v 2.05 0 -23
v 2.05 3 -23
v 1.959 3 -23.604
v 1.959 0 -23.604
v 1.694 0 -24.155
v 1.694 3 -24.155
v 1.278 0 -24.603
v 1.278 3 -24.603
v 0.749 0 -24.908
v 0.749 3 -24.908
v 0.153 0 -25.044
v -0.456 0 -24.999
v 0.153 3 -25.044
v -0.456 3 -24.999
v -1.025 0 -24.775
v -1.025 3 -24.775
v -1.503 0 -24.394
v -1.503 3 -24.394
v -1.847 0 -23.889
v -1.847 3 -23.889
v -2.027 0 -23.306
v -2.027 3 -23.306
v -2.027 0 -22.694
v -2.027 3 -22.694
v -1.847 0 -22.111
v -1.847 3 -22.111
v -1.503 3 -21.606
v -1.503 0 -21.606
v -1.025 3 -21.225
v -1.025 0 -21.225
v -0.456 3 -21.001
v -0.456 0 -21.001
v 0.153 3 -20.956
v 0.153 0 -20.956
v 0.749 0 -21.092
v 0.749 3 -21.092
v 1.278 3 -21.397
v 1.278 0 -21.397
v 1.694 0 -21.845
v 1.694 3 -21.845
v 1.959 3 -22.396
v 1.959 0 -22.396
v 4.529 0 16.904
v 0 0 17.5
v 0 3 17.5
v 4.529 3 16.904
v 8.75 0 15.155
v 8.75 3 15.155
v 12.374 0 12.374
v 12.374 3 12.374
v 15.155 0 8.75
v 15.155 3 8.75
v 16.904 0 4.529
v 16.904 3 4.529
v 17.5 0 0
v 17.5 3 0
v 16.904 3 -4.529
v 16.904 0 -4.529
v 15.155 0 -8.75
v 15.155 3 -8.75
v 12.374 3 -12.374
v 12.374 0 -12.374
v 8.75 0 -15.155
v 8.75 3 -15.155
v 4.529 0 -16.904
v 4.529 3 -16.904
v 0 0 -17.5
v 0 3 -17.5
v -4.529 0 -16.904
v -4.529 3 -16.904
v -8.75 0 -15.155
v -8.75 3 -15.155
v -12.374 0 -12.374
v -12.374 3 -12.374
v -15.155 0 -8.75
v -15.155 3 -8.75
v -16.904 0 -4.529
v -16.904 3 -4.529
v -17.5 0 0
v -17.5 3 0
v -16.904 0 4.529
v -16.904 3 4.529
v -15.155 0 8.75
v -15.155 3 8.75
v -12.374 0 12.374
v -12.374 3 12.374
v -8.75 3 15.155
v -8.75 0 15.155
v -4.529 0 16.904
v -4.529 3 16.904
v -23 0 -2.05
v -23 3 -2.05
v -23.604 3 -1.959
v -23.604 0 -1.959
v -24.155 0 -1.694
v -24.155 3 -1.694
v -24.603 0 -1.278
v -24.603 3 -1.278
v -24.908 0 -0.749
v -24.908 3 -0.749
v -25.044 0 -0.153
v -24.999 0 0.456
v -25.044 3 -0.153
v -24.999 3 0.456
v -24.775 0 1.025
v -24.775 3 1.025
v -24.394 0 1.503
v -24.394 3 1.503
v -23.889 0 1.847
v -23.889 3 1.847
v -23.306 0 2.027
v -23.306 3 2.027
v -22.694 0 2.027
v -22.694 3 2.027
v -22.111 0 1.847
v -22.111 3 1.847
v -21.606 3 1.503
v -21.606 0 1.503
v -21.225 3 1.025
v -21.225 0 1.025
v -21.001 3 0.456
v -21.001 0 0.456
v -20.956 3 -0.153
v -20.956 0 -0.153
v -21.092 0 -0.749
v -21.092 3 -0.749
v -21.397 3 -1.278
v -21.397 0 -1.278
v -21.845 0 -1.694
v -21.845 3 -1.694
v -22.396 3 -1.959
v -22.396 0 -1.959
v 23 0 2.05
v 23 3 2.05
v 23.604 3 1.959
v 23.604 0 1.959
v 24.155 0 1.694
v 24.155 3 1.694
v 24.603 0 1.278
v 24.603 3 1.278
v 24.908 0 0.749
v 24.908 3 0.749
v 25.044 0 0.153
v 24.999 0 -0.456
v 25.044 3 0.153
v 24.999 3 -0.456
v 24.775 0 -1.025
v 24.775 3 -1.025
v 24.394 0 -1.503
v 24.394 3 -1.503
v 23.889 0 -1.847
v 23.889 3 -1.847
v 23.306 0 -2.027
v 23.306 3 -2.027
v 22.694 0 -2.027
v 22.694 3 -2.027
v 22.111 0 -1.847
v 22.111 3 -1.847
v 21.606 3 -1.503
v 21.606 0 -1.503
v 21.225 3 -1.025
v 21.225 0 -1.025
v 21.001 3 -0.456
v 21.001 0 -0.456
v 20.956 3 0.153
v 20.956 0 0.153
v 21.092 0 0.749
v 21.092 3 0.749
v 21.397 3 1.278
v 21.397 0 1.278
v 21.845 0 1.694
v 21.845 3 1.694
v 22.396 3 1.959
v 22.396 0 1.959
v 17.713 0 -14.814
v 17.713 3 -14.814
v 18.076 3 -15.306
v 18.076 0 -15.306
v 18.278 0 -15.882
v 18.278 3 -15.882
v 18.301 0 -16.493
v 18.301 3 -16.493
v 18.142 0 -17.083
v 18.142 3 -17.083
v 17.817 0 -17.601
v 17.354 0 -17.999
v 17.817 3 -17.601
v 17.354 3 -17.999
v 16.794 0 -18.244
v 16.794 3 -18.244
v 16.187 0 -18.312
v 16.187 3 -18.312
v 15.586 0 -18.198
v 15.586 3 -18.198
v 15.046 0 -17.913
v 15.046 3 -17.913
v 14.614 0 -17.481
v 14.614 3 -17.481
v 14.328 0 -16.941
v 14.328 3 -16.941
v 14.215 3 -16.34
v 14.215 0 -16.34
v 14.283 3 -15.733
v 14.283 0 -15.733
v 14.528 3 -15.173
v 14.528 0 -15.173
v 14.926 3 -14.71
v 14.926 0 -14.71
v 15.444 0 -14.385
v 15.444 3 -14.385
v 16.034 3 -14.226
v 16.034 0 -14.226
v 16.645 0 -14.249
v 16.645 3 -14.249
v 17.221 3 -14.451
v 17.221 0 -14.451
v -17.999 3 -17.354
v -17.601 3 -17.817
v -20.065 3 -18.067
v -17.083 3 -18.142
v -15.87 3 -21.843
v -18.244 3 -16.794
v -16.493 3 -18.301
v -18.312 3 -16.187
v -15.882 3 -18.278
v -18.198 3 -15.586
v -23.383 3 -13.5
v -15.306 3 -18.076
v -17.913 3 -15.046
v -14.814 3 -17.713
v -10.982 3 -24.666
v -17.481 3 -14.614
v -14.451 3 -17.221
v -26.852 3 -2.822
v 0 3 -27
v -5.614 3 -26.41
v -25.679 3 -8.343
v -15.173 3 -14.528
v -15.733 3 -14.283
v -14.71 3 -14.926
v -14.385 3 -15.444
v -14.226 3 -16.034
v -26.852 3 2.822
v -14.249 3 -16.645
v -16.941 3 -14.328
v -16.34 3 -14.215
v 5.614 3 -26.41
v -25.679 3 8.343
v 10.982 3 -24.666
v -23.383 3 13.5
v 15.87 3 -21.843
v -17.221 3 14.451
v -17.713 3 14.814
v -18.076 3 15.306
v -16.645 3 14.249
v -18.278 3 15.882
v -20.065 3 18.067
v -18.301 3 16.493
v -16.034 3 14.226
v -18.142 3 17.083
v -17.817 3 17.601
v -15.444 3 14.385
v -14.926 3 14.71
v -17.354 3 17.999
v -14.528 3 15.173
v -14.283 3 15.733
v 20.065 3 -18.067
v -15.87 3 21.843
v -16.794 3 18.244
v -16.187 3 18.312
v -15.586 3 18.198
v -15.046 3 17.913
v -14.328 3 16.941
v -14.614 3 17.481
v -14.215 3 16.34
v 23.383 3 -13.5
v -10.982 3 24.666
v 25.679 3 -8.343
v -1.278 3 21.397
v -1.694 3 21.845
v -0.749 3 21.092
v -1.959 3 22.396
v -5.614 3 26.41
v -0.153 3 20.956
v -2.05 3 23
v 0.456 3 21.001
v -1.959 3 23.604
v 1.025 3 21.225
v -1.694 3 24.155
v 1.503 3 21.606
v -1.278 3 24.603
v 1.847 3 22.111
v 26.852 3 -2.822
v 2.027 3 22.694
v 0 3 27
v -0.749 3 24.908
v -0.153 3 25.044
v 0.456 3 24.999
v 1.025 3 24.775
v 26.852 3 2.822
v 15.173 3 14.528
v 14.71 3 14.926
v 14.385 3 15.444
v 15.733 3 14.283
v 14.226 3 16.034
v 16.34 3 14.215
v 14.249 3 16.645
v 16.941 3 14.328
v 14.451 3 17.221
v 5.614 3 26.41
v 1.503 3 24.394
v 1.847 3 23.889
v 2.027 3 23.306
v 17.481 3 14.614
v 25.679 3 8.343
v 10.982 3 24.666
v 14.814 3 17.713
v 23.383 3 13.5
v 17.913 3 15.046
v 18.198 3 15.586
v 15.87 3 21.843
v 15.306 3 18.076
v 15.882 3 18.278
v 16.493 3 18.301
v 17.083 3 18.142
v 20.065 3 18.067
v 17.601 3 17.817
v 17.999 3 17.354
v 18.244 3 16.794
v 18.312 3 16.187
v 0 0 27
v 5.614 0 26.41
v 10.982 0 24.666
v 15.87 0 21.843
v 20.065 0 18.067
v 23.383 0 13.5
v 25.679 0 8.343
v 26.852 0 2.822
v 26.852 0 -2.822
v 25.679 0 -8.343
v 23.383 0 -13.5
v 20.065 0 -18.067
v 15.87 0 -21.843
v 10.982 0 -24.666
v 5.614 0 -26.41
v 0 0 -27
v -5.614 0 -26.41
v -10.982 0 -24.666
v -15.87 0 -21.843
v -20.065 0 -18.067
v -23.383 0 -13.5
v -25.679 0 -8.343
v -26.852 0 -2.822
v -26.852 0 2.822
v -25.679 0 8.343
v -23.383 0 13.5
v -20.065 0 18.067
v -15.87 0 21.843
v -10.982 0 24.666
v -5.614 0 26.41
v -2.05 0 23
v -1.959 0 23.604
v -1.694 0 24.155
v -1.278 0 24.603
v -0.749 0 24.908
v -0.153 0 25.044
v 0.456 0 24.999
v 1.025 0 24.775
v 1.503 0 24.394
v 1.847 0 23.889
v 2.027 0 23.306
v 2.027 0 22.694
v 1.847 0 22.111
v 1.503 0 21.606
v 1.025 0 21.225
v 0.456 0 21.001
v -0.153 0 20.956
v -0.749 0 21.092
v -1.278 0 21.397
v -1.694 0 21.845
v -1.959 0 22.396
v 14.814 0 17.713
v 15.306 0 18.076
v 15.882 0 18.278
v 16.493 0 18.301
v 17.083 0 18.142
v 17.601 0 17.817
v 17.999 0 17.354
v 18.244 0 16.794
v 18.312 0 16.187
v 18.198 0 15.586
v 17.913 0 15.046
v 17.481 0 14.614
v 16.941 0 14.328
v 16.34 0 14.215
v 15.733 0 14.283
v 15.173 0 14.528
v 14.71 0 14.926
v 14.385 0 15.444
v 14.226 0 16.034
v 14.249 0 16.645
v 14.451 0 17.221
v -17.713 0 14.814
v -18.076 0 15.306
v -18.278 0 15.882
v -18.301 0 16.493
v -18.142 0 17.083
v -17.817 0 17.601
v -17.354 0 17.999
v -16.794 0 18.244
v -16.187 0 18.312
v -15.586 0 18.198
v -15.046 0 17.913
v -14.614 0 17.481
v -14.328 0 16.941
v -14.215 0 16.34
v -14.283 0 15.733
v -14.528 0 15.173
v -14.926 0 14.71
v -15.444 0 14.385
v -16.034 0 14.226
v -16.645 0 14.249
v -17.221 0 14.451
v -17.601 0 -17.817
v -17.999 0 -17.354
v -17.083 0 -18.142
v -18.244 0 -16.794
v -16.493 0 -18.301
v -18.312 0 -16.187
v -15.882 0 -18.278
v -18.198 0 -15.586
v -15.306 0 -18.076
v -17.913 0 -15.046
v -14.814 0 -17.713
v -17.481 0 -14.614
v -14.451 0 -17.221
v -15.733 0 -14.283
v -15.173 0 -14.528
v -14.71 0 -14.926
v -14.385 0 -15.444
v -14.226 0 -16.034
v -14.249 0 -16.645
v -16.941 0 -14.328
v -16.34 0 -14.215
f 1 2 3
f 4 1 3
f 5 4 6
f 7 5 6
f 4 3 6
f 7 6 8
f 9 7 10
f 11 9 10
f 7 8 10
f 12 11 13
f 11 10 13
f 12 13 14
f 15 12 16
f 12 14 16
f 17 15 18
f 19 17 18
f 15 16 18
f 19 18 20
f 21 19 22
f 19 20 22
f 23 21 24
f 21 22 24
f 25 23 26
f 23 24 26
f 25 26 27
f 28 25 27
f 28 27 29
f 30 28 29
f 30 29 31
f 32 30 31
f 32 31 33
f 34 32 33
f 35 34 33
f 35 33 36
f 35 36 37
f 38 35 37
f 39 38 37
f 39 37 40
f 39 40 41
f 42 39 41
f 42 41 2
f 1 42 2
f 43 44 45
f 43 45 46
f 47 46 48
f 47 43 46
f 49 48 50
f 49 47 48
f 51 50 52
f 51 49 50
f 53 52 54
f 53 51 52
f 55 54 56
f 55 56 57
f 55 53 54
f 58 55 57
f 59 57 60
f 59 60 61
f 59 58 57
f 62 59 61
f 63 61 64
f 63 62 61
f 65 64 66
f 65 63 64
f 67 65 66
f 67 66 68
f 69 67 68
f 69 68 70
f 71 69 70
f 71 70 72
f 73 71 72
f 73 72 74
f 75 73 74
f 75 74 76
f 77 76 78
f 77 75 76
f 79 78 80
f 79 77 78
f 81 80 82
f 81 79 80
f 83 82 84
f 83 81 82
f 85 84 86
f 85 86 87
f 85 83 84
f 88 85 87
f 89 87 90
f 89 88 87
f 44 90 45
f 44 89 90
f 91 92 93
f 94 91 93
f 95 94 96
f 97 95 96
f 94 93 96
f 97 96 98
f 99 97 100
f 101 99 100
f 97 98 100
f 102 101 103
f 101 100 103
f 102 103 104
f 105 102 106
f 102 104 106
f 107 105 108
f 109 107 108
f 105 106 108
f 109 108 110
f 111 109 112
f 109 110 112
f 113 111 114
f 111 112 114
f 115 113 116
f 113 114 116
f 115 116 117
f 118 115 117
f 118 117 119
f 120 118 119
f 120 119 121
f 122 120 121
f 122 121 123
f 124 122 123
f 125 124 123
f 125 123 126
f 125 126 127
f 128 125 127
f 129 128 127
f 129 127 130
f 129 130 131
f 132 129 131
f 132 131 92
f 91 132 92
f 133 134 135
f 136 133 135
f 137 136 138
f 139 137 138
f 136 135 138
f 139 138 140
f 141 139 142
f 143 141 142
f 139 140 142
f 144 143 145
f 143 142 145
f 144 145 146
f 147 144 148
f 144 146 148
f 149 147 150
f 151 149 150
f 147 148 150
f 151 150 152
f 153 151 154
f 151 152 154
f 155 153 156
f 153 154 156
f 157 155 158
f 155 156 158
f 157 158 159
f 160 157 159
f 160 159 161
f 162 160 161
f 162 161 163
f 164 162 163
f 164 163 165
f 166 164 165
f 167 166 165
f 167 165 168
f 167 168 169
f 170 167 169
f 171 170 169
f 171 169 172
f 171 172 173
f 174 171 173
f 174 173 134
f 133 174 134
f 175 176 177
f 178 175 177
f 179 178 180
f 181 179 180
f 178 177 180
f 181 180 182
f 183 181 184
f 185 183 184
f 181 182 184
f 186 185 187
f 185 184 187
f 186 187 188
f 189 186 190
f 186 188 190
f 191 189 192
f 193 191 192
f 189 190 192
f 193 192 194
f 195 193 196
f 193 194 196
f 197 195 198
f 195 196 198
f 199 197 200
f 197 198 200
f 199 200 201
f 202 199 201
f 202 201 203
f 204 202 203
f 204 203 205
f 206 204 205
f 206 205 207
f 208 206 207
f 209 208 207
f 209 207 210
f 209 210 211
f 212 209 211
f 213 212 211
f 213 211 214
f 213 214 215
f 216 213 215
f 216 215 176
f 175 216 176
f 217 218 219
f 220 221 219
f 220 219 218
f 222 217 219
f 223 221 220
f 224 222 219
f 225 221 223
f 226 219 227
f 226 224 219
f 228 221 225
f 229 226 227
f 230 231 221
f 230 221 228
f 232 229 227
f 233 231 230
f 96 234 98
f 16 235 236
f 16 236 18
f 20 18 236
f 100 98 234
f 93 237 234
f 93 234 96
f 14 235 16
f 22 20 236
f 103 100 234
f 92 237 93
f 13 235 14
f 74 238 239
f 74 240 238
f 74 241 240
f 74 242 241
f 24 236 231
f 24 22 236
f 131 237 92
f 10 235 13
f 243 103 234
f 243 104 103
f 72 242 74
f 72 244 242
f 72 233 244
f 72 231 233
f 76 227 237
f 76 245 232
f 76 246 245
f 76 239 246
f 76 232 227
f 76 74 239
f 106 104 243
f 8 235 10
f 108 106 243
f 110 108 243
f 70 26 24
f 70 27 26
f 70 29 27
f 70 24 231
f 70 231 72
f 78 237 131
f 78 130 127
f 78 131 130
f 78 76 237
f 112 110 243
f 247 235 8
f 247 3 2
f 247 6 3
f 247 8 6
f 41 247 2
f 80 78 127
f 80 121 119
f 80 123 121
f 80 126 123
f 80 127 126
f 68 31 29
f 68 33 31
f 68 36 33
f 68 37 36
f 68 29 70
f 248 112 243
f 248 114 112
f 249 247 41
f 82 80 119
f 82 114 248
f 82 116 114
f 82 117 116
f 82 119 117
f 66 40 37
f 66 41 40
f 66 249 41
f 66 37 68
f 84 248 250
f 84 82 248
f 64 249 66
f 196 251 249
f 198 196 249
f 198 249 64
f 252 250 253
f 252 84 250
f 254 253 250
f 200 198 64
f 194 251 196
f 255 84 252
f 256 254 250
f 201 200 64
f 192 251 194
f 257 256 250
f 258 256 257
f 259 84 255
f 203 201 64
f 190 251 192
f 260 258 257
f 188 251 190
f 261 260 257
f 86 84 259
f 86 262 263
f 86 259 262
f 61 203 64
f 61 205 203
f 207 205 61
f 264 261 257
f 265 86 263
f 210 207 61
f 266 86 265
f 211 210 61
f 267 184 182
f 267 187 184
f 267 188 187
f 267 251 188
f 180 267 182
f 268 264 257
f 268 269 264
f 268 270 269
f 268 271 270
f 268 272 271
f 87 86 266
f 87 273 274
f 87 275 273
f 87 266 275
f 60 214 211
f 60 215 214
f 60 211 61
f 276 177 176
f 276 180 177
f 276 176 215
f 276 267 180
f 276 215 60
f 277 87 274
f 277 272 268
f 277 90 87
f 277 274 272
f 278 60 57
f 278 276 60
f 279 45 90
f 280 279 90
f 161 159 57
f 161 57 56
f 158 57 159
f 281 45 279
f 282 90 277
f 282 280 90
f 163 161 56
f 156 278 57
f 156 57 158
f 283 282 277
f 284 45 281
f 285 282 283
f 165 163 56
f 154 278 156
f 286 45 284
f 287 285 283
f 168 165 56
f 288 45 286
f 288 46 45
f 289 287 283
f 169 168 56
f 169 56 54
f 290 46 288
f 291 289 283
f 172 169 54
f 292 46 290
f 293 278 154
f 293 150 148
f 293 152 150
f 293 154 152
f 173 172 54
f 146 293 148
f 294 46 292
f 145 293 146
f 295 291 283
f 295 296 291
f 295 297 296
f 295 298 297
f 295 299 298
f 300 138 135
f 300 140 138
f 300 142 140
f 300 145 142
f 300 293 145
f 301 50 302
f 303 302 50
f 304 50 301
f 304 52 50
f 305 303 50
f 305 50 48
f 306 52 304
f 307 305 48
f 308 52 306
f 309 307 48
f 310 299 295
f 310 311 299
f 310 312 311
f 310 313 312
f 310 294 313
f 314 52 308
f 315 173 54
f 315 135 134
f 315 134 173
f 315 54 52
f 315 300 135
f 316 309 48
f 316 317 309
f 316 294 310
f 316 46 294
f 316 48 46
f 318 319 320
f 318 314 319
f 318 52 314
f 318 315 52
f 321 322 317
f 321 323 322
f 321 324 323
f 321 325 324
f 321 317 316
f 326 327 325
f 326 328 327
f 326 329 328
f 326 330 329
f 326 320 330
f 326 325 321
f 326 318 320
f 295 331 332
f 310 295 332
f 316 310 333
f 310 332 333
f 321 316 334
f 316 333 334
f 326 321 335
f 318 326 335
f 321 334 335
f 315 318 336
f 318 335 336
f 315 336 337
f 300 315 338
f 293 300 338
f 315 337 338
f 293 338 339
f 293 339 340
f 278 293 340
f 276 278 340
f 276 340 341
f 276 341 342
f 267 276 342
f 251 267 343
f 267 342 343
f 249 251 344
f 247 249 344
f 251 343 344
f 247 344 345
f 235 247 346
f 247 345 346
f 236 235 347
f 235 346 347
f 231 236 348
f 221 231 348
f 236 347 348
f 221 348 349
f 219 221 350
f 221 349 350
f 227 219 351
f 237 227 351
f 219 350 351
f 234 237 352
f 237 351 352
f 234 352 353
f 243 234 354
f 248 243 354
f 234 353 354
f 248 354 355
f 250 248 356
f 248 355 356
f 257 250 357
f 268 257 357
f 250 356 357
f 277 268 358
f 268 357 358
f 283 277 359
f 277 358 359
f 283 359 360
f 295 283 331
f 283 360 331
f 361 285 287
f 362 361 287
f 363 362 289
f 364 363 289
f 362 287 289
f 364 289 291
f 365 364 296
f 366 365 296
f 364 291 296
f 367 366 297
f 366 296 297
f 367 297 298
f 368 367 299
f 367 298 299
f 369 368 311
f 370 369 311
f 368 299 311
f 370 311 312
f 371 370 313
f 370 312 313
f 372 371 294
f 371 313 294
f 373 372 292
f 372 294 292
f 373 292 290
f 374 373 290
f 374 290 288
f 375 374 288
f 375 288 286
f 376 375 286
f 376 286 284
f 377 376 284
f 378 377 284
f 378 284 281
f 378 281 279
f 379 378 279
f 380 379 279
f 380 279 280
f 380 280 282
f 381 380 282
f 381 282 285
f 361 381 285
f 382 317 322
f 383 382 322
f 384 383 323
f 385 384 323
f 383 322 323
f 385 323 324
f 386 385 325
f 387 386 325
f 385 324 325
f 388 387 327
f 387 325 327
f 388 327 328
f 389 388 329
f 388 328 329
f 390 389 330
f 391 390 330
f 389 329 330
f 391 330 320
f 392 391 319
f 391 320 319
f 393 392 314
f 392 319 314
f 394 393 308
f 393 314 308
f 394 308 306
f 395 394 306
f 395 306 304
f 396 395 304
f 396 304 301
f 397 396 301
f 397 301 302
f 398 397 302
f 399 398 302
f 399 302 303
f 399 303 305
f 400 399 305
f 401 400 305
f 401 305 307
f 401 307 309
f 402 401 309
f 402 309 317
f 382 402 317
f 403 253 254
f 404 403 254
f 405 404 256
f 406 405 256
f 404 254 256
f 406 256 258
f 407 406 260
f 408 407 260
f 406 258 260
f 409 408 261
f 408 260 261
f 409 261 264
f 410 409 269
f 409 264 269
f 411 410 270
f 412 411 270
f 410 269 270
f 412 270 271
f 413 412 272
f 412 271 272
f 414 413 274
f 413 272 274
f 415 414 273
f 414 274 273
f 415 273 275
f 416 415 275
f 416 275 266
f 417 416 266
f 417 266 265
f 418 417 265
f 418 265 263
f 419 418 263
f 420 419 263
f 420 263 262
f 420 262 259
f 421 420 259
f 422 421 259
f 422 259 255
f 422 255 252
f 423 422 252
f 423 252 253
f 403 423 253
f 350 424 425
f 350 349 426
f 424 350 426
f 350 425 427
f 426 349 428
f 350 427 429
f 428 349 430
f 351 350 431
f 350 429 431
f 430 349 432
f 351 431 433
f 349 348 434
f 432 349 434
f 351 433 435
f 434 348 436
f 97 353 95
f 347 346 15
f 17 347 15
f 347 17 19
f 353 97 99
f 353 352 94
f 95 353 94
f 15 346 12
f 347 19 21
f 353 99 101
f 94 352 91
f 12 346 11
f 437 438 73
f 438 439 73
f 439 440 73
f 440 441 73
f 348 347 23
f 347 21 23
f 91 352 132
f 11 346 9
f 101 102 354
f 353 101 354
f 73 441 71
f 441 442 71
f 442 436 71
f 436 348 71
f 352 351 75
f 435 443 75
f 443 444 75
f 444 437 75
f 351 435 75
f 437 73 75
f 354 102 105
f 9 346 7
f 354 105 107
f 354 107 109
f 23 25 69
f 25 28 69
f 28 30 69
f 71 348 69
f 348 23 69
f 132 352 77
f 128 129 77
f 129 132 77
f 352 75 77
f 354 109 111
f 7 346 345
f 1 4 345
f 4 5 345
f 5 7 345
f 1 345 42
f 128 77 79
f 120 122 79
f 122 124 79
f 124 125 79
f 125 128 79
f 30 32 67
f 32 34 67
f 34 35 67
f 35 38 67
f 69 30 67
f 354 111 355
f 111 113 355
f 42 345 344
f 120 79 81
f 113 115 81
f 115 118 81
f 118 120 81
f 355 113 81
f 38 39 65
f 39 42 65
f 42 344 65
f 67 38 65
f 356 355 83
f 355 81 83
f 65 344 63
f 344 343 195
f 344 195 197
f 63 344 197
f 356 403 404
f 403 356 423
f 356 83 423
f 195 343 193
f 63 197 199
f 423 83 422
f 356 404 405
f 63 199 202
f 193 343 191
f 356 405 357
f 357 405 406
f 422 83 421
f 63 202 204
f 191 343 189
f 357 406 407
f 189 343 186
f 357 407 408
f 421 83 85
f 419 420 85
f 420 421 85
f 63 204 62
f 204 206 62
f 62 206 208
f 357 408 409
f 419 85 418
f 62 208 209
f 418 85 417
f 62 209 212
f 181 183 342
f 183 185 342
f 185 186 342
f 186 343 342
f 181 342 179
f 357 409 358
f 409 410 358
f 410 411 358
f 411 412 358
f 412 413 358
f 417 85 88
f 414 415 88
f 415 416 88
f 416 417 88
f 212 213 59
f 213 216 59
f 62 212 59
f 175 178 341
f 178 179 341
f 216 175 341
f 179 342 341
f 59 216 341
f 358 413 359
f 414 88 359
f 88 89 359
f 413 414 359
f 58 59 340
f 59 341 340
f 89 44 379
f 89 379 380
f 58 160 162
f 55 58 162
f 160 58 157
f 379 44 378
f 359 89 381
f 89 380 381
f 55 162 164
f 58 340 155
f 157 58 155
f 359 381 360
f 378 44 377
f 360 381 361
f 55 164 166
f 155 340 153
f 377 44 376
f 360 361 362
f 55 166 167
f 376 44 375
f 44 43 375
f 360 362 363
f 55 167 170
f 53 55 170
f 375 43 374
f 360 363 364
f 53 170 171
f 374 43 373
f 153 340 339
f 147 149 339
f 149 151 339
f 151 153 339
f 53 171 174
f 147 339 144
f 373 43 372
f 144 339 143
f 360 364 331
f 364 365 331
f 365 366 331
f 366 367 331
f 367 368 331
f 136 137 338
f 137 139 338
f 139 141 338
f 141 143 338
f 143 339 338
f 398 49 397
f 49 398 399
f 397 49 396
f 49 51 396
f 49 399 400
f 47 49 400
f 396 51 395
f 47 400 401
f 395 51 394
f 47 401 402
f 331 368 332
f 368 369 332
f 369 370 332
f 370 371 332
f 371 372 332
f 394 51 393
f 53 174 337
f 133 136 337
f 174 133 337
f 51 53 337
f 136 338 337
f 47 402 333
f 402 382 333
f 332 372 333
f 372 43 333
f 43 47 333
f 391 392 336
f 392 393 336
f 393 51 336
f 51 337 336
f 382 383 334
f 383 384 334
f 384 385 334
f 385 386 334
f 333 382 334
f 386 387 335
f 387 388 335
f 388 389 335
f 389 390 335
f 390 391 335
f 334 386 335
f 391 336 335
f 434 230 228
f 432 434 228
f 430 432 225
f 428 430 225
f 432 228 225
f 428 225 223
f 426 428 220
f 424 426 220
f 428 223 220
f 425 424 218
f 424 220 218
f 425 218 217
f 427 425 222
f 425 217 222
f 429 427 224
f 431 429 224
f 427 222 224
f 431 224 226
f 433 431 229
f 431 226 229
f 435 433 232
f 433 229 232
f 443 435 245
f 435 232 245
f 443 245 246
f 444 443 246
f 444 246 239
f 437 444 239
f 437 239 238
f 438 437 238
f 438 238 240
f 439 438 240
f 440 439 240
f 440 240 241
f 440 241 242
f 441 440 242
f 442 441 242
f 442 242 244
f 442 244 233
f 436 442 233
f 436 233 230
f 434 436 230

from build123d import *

# Parameters (mm, degrees)
SKETCH1_R           = 27
SKETCH1_R_2         = 17.5
BOSS_EXTRUDE1_DEPTH = 3
SKETCH2_R           = 2.05
CUT_EXTRUDE1_DEPTH  = 39.301436004
CIRPATTERN1_COUNT   = 8


with BuildPart() as part:
    # Sketch1 → Boss-Extrude1 (new body)
    with BuildSketch(Plane(origin=(0, 0, 0), x_dir=(1, 0, 0), z_dir=(0, 1, 0))):
        with Locations(Location((0, 0, 0), (0, 0, 270))):
            Circle(SKETCH1_R)
        with Locations(Location((0, 0, 0), (0, 0, 270))):
            Circle(SKETCH1_R_2, mode=Mode.SUBTRACT)
    extrude(amount=BOSS_EXTRUDE1_DEPTH)

    # Sketch2 → Cut-Extrude1 (cut, through all)
    with BuildSketch(Plane(origin=(0, 3, 0), x_dir=(1, 0, 0), z_dir=(0, 1, 0))):
        with Locations(Location((23, 0, 0), (0, 0, 270))):
            Circle(SKETCH2_R)
    cut_extrude1 = extrude(amount=-CUT_EXTRUDE1_DEPTH, mode=Mode.SUBTRACT)

    # CirPattern1: Cut-Extrude1 ×8 about axis
    cirpattern1_axis = Axis((0, 0, 0), (0, 1, 0))
    for i in range(1, CIRPATTERN1_COUNT):
        add(cut_extrude1.rotate(cirpattern1_axis, i * 360 / CIRPATTERN1_COUNT), mode=Mode.SUBTRACT)


solid = part.part
